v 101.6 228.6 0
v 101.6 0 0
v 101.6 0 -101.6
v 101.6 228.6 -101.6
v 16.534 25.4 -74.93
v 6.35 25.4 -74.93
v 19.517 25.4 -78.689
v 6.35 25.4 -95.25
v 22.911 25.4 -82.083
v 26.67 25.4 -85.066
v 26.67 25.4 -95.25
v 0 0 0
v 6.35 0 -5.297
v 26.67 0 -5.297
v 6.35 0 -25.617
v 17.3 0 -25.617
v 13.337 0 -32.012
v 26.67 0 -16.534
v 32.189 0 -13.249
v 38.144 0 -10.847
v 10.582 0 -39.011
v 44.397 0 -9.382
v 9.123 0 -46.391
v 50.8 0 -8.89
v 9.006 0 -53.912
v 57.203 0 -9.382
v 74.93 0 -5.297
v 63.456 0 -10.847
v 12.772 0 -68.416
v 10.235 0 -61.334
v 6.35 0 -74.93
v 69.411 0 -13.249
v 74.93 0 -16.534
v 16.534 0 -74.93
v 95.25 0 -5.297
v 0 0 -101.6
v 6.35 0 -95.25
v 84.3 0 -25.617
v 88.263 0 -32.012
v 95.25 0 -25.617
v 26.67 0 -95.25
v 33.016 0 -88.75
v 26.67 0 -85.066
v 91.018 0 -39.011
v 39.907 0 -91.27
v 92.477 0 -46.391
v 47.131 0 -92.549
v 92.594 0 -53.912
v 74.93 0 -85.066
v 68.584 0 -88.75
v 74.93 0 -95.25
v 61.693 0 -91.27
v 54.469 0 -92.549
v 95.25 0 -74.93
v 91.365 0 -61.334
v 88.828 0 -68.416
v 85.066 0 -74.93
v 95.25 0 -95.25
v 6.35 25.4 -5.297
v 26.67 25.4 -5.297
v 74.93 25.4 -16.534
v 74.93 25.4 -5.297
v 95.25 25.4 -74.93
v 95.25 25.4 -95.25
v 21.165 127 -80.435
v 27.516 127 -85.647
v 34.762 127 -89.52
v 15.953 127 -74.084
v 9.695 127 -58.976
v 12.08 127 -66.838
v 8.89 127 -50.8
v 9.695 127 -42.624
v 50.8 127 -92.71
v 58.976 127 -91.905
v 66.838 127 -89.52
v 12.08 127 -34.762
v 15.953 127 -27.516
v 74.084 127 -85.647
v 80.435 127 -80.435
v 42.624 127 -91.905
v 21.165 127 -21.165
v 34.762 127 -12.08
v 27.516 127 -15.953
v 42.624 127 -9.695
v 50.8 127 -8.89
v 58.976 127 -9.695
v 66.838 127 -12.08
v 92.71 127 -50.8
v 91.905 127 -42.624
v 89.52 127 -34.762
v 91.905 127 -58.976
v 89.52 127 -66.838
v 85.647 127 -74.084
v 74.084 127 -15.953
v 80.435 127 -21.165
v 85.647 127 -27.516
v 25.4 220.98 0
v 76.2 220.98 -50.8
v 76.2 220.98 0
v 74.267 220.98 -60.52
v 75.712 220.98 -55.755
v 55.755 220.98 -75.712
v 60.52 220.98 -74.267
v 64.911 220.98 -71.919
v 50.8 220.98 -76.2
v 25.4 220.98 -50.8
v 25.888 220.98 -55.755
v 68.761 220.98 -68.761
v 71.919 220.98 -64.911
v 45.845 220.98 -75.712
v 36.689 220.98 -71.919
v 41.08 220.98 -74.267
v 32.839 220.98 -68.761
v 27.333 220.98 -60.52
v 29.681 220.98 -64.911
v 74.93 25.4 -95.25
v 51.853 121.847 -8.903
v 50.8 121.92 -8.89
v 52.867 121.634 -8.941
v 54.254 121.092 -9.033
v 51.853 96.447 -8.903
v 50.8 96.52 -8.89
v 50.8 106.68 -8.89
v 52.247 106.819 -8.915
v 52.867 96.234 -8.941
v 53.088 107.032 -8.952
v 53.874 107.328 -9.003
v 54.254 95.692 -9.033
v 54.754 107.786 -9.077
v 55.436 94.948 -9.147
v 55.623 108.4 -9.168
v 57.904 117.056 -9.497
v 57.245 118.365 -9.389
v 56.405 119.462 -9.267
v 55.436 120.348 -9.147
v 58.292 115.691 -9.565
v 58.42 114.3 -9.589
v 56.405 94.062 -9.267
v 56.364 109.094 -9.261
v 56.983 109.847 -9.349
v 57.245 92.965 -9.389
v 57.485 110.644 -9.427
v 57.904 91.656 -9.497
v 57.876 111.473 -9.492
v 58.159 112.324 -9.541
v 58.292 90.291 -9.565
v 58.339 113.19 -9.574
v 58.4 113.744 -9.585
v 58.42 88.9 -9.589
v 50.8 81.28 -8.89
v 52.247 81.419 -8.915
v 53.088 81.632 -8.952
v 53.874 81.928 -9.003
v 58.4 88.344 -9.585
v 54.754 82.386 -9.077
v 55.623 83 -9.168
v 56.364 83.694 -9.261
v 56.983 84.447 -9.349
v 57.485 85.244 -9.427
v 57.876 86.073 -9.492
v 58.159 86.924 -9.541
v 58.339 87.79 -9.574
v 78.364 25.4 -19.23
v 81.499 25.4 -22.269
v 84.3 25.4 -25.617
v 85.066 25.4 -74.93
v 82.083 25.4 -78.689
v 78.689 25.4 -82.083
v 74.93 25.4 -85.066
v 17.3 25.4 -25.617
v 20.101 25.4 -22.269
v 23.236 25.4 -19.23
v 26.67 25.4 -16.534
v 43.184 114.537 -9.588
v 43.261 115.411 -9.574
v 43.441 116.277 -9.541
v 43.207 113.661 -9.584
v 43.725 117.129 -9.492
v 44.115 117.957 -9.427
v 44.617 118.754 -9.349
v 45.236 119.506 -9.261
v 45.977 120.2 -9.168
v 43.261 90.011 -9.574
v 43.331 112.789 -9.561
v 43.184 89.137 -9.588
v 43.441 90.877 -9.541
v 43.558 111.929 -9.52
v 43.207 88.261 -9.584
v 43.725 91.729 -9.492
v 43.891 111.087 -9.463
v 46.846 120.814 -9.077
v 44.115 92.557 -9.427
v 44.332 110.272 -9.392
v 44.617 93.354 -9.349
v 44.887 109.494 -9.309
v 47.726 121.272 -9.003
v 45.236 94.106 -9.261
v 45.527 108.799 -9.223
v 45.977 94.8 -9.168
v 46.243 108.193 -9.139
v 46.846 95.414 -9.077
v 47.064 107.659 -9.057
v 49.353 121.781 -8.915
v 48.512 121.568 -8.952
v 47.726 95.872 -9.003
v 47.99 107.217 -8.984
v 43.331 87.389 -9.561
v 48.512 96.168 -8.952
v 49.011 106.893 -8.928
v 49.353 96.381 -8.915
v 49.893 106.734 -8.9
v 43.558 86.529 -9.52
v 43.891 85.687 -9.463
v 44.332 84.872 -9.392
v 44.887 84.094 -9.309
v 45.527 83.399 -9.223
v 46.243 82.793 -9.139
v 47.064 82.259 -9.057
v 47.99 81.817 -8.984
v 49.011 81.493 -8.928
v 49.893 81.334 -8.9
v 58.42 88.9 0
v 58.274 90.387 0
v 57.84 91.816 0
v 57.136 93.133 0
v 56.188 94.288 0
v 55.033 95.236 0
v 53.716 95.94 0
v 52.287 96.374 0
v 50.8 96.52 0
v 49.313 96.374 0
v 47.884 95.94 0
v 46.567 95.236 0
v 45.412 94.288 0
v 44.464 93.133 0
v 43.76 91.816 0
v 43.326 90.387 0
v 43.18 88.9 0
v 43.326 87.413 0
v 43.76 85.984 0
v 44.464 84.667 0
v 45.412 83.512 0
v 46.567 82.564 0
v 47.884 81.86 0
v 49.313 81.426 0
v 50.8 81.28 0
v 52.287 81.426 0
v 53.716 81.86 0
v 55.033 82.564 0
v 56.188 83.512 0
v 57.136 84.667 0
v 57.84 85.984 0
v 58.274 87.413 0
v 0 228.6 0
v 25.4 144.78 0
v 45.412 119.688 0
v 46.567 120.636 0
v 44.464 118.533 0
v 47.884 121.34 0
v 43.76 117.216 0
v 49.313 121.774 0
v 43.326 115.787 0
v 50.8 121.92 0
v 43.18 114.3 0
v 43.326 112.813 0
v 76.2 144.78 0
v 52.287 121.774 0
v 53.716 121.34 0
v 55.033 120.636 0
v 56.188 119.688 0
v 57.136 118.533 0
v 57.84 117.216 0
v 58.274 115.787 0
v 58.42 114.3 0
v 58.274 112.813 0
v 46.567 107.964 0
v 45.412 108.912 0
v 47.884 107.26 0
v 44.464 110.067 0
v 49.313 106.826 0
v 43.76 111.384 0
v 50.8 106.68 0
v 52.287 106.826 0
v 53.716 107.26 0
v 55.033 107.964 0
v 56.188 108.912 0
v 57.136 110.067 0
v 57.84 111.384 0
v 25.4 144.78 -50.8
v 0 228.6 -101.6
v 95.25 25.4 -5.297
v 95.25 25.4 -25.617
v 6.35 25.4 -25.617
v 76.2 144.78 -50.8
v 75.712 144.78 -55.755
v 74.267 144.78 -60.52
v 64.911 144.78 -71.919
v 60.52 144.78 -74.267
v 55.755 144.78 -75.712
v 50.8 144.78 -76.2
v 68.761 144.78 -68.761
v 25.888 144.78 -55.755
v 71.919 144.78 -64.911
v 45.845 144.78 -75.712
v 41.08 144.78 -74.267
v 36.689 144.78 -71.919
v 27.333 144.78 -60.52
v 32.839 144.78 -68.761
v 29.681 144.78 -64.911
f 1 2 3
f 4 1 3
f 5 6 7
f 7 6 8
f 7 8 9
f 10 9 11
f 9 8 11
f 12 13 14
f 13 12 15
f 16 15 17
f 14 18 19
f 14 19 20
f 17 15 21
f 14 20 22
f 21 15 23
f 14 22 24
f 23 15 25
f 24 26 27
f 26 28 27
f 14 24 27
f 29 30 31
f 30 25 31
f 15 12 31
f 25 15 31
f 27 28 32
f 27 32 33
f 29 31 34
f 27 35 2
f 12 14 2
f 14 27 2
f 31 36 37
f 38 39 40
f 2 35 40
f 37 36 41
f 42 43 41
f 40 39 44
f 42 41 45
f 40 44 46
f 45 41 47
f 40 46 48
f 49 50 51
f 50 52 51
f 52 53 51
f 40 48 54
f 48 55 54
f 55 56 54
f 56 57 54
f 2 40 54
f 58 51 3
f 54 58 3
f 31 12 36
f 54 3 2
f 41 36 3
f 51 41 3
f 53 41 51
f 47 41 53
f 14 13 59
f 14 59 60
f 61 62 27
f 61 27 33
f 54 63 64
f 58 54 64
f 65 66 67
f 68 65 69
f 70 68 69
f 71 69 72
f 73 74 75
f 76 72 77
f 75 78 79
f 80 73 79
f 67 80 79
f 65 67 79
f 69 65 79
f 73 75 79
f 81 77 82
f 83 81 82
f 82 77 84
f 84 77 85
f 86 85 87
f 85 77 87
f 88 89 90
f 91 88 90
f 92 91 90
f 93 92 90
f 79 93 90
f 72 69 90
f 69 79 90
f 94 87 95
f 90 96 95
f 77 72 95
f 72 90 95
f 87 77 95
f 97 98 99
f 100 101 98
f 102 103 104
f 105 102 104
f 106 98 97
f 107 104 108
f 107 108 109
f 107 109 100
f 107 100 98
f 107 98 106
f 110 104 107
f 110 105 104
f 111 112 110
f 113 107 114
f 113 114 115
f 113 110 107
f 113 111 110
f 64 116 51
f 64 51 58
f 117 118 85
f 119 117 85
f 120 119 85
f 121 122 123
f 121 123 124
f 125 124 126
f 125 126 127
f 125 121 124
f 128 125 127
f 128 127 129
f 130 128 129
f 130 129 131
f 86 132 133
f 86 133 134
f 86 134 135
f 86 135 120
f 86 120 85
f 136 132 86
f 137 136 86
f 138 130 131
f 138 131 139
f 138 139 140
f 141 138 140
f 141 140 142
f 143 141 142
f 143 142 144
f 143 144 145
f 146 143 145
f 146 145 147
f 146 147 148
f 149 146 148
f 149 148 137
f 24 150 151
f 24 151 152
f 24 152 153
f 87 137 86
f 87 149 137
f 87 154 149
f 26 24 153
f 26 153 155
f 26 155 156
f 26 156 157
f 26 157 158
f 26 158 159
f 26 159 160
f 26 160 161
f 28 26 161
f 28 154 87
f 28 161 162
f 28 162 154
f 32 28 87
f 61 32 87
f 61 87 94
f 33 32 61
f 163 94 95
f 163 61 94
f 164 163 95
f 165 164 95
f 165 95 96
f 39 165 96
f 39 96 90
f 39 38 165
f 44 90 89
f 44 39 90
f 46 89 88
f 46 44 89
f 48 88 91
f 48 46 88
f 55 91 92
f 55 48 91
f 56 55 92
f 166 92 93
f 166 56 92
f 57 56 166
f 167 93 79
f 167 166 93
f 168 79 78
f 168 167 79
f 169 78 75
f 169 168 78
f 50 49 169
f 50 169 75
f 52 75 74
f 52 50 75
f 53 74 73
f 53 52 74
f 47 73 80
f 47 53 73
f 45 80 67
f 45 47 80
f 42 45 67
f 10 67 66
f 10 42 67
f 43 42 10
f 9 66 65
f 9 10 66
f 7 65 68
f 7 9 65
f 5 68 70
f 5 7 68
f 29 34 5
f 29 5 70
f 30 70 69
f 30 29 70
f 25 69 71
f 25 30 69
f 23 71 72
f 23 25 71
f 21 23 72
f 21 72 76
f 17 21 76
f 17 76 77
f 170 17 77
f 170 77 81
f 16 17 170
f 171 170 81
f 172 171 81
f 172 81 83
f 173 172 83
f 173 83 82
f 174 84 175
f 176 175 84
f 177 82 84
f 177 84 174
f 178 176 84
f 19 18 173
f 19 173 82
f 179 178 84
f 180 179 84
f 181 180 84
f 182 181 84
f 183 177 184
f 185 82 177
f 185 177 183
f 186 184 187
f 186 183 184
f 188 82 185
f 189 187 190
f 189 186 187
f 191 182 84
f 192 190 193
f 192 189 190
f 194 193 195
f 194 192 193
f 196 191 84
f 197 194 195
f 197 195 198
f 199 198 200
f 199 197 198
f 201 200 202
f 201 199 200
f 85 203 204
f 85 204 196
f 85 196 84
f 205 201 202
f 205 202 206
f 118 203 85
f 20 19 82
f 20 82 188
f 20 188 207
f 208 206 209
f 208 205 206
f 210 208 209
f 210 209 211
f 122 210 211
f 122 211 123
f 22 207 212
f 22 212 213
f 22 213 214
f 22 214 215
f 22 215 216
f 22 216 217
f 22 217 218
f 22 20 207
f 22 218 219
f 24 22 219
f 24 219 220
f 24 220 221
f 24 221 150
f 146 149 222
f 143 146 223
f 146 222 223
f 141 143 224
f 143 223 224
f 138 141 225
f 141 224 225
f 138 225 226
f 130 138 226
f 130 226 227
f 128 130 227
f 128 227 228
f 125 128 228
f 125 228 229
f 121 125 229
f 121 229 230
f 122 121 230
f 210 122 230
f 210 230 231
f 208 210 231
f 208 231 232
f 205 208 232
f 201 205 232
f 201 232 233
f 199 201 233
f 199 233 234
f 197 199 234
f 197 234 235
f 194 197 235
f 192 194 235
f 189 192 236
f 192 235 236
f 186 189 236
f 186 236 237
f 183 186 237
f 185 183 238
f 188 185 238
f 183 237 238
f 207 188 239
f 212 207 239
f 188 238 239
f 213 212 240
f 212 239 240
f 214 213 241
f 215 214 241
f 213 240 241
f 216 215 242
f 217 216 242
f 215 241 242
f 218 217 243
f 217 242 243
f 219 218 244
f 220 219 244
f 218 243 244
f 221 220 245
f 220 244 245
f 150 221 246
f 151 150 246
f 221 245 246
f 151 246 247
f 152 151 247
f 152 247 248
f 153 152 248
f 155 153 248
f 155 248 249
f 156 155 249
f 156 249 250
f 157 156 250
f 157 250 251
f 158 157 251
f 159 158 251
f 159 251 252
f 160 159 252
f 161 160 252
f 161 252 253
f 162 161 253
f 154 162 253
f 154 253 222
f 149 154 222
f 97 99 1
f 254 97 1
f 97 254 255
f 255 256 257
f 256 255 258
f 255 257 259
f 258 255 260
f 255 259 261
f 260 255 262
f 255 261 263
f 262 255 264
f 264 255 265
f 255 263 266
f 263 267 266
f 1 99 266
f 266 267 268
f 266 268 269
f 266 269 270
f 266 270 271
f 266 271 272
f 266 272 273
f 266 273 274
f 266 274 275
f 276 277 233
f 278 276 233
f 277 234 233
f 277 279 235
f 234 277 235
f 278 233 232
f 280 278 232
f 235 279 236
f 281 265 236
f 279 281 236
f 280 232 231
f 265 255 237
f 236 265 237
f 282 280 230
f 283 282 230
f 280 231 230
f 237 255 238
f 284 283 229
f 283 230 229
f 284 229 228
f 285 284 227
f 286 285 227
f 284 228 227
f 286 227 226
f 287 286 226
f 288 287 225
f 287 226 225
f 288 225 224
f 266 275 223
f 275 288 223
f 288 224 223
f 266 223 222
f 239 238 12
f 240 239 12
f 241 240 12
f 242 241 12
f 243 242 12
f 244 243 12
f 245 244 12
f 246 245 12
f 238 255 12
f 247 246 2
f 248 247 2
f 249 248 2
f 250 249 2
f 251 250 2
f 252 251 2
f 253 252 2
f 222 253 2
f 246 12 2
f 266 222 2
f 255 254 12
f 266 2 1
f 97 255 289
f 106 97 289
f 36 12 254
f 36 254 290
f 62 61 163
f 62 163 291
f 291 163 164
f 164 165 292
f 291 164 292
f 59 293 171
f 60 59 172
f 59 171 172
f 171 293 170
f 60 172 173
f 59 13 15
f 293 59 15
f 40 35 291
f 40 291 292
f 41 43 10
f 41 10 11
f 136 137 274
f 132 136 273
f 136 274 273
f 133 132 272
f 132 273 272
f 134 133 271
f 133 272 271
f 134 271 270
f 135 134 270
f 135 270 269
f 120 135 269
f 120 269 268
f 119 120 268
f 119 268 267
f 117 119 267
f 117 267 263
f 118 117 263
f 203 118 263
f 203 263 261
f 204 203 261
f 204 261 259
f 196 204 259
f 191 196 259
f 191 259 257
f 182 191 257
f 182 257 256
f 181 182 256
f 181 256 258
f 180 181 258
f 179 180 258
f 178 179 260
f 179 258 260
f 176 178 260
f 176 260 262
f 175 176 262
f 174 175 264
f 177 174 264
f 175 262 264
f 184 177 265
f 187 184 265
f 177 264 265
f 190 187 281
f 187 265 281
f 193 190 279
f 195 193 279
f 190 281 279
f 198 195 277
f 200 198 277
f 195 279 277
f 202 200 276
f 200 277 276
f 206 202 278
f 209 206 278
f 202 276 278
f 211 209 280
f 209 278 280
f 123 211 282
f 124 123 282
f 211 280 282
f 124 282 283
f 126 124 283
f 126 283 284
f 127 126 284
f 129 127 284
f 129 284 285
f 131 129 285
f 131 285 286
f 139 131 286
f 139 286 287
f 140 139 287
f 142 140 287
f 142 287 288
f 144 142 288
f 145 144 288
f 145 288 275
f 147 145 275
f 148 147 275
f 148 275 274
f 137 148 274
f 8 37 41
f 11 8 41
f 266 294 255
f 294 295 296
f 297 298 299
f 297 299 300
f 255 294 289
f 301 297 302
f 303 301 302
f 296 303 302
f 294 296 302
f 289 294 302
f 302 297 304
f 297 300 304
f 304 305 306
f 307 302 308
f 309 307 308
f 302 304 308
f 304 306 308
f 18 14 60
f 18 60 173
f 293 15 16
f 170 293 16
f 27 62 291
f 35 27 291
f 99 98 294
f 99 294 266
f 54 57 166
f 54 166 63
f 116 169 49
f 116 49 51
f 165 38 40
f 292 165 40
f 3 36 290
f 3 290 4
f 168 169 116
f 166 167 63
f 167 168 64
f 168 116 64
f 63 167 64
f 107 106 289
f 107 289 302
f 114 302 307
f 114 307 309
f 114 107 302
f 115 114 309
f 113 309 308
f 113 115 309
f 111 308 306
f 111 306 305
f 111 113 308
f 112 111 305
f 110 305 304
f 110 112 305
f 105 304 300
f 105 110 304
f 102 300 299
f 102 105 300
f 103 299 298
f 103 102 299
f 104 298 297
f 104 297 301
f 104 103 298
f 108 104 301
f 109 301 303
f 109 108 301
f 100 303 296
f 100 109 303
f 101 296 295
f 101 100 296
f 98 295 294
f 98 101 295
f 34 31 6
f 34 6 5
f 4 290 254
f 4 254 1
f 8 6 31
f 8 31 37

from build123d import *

# Parameters (mm, degrees)
SKETCH5_W           = 101.6
SKETCH5_H           = 101.6
BOSS_EXTRUDE1_DEPTH = 228.6
SKETCH6_R           = 41.91
CUT_EXTRUDE1_DEPTH  = 127
SKETCH5_3_W         = 20.32
SKETCH5_3_H         = 20.32
CUT_EXTRUDE2_DEPTH  = 25.4
CUT_EXTRUDE3_DEPTH  = 76.2
SKETCH9_R           = 7.62
CUT_EXTRUDE4_DEPTH  = 56.642


with BuildPart() as part:
    # Sketch5 → Boss-Extrude1 (new body)
    with BuildSketch(Plane(origin=(0, 0, 0), x_dir=(1, 0, 0), z_dir=(0, 1, 0))):
        with Locations((50.8, 50.8)):
            Rectangle(SKETCH5_W, SKETCH5_H)
    extrude(amount=BOSS_EXTRUDE1_DEPTH)

    # Sketch6 → Cut-Extrude1 (cut)
    with BuildSketch(Plane(origin=(0, 0, 0), x_dir=(1, 0, 0), z_dir=(0, 1, 0))):
        with Locations((50.8, 50.8)):
            Circle(SKETCH6_R)
    extrude(amount=CUT_EXTRUDE1_DEPTH, mode=Mode.SUBTRACT)

    # Sketch5<3> → Cut-Extrude2 (cut)
    with BuildSketch(Plane(origin=(0, 0, 0), x_dir=(1, 0, 0), z_dir=(0, 1, 0))):
        with Locations((85.09, 15.457317153)):
            Rectangle(SKETCH5_3_W, SKETCH5_3_H)
        with Locations((16.51, 15.457317153)):
            Rectangle(SKETCH5_3_W, SKETCH5_3_H)
        with Locations((85.09, 85.09)):
            Rectangle(SKETCH5_3_W, SKETCH5_3_H)
        with Locations((16.51, 85.09)):
            Rectangle(SKETCH5_3_W, SKETCH5_3_H)
    extrude(amount=CUT_EXTRUDE2_DEPTH, mode=Mode.SUBTRACT)

    # Sketch7 → Cut-Extrude3 (cut)
    with BuildSketch(Plane(origin=(0, 220.98, 0), x_dir=(1, 0, 0), z_dir=(0, 1, 0))):
        with BuildLine():
            Line((76.2, 50.8), (76.2, -137.296764807))
            Line((76.2, -137.296764807), (25.4, -137.296764807))
            Line((25.4, -137.296764807), (25.4, 50.8))
            ThreePointArc((25.4, 50.8), (50.8, 76.2), (76.2, 50.8))
        make_face()
    extrude(amount=-CUT_EXTRUDE3_DEPTH, mode=Mode.SUBTRACT)

    # Sketch9 → Cut-Extrude4 (cut)
    with BuildSketch(Plane.XY):
        with Locations((50.8, 114.3)):
            Circle(SKETCH9_R)
        with Locations((50.8, 88.9)):
            Circle(SKETCH9_R)
    extrude(amount=-CUT_EXTRUDE4_DEPTH, mode=Mode.SUBTRACT)


solid = part.part
